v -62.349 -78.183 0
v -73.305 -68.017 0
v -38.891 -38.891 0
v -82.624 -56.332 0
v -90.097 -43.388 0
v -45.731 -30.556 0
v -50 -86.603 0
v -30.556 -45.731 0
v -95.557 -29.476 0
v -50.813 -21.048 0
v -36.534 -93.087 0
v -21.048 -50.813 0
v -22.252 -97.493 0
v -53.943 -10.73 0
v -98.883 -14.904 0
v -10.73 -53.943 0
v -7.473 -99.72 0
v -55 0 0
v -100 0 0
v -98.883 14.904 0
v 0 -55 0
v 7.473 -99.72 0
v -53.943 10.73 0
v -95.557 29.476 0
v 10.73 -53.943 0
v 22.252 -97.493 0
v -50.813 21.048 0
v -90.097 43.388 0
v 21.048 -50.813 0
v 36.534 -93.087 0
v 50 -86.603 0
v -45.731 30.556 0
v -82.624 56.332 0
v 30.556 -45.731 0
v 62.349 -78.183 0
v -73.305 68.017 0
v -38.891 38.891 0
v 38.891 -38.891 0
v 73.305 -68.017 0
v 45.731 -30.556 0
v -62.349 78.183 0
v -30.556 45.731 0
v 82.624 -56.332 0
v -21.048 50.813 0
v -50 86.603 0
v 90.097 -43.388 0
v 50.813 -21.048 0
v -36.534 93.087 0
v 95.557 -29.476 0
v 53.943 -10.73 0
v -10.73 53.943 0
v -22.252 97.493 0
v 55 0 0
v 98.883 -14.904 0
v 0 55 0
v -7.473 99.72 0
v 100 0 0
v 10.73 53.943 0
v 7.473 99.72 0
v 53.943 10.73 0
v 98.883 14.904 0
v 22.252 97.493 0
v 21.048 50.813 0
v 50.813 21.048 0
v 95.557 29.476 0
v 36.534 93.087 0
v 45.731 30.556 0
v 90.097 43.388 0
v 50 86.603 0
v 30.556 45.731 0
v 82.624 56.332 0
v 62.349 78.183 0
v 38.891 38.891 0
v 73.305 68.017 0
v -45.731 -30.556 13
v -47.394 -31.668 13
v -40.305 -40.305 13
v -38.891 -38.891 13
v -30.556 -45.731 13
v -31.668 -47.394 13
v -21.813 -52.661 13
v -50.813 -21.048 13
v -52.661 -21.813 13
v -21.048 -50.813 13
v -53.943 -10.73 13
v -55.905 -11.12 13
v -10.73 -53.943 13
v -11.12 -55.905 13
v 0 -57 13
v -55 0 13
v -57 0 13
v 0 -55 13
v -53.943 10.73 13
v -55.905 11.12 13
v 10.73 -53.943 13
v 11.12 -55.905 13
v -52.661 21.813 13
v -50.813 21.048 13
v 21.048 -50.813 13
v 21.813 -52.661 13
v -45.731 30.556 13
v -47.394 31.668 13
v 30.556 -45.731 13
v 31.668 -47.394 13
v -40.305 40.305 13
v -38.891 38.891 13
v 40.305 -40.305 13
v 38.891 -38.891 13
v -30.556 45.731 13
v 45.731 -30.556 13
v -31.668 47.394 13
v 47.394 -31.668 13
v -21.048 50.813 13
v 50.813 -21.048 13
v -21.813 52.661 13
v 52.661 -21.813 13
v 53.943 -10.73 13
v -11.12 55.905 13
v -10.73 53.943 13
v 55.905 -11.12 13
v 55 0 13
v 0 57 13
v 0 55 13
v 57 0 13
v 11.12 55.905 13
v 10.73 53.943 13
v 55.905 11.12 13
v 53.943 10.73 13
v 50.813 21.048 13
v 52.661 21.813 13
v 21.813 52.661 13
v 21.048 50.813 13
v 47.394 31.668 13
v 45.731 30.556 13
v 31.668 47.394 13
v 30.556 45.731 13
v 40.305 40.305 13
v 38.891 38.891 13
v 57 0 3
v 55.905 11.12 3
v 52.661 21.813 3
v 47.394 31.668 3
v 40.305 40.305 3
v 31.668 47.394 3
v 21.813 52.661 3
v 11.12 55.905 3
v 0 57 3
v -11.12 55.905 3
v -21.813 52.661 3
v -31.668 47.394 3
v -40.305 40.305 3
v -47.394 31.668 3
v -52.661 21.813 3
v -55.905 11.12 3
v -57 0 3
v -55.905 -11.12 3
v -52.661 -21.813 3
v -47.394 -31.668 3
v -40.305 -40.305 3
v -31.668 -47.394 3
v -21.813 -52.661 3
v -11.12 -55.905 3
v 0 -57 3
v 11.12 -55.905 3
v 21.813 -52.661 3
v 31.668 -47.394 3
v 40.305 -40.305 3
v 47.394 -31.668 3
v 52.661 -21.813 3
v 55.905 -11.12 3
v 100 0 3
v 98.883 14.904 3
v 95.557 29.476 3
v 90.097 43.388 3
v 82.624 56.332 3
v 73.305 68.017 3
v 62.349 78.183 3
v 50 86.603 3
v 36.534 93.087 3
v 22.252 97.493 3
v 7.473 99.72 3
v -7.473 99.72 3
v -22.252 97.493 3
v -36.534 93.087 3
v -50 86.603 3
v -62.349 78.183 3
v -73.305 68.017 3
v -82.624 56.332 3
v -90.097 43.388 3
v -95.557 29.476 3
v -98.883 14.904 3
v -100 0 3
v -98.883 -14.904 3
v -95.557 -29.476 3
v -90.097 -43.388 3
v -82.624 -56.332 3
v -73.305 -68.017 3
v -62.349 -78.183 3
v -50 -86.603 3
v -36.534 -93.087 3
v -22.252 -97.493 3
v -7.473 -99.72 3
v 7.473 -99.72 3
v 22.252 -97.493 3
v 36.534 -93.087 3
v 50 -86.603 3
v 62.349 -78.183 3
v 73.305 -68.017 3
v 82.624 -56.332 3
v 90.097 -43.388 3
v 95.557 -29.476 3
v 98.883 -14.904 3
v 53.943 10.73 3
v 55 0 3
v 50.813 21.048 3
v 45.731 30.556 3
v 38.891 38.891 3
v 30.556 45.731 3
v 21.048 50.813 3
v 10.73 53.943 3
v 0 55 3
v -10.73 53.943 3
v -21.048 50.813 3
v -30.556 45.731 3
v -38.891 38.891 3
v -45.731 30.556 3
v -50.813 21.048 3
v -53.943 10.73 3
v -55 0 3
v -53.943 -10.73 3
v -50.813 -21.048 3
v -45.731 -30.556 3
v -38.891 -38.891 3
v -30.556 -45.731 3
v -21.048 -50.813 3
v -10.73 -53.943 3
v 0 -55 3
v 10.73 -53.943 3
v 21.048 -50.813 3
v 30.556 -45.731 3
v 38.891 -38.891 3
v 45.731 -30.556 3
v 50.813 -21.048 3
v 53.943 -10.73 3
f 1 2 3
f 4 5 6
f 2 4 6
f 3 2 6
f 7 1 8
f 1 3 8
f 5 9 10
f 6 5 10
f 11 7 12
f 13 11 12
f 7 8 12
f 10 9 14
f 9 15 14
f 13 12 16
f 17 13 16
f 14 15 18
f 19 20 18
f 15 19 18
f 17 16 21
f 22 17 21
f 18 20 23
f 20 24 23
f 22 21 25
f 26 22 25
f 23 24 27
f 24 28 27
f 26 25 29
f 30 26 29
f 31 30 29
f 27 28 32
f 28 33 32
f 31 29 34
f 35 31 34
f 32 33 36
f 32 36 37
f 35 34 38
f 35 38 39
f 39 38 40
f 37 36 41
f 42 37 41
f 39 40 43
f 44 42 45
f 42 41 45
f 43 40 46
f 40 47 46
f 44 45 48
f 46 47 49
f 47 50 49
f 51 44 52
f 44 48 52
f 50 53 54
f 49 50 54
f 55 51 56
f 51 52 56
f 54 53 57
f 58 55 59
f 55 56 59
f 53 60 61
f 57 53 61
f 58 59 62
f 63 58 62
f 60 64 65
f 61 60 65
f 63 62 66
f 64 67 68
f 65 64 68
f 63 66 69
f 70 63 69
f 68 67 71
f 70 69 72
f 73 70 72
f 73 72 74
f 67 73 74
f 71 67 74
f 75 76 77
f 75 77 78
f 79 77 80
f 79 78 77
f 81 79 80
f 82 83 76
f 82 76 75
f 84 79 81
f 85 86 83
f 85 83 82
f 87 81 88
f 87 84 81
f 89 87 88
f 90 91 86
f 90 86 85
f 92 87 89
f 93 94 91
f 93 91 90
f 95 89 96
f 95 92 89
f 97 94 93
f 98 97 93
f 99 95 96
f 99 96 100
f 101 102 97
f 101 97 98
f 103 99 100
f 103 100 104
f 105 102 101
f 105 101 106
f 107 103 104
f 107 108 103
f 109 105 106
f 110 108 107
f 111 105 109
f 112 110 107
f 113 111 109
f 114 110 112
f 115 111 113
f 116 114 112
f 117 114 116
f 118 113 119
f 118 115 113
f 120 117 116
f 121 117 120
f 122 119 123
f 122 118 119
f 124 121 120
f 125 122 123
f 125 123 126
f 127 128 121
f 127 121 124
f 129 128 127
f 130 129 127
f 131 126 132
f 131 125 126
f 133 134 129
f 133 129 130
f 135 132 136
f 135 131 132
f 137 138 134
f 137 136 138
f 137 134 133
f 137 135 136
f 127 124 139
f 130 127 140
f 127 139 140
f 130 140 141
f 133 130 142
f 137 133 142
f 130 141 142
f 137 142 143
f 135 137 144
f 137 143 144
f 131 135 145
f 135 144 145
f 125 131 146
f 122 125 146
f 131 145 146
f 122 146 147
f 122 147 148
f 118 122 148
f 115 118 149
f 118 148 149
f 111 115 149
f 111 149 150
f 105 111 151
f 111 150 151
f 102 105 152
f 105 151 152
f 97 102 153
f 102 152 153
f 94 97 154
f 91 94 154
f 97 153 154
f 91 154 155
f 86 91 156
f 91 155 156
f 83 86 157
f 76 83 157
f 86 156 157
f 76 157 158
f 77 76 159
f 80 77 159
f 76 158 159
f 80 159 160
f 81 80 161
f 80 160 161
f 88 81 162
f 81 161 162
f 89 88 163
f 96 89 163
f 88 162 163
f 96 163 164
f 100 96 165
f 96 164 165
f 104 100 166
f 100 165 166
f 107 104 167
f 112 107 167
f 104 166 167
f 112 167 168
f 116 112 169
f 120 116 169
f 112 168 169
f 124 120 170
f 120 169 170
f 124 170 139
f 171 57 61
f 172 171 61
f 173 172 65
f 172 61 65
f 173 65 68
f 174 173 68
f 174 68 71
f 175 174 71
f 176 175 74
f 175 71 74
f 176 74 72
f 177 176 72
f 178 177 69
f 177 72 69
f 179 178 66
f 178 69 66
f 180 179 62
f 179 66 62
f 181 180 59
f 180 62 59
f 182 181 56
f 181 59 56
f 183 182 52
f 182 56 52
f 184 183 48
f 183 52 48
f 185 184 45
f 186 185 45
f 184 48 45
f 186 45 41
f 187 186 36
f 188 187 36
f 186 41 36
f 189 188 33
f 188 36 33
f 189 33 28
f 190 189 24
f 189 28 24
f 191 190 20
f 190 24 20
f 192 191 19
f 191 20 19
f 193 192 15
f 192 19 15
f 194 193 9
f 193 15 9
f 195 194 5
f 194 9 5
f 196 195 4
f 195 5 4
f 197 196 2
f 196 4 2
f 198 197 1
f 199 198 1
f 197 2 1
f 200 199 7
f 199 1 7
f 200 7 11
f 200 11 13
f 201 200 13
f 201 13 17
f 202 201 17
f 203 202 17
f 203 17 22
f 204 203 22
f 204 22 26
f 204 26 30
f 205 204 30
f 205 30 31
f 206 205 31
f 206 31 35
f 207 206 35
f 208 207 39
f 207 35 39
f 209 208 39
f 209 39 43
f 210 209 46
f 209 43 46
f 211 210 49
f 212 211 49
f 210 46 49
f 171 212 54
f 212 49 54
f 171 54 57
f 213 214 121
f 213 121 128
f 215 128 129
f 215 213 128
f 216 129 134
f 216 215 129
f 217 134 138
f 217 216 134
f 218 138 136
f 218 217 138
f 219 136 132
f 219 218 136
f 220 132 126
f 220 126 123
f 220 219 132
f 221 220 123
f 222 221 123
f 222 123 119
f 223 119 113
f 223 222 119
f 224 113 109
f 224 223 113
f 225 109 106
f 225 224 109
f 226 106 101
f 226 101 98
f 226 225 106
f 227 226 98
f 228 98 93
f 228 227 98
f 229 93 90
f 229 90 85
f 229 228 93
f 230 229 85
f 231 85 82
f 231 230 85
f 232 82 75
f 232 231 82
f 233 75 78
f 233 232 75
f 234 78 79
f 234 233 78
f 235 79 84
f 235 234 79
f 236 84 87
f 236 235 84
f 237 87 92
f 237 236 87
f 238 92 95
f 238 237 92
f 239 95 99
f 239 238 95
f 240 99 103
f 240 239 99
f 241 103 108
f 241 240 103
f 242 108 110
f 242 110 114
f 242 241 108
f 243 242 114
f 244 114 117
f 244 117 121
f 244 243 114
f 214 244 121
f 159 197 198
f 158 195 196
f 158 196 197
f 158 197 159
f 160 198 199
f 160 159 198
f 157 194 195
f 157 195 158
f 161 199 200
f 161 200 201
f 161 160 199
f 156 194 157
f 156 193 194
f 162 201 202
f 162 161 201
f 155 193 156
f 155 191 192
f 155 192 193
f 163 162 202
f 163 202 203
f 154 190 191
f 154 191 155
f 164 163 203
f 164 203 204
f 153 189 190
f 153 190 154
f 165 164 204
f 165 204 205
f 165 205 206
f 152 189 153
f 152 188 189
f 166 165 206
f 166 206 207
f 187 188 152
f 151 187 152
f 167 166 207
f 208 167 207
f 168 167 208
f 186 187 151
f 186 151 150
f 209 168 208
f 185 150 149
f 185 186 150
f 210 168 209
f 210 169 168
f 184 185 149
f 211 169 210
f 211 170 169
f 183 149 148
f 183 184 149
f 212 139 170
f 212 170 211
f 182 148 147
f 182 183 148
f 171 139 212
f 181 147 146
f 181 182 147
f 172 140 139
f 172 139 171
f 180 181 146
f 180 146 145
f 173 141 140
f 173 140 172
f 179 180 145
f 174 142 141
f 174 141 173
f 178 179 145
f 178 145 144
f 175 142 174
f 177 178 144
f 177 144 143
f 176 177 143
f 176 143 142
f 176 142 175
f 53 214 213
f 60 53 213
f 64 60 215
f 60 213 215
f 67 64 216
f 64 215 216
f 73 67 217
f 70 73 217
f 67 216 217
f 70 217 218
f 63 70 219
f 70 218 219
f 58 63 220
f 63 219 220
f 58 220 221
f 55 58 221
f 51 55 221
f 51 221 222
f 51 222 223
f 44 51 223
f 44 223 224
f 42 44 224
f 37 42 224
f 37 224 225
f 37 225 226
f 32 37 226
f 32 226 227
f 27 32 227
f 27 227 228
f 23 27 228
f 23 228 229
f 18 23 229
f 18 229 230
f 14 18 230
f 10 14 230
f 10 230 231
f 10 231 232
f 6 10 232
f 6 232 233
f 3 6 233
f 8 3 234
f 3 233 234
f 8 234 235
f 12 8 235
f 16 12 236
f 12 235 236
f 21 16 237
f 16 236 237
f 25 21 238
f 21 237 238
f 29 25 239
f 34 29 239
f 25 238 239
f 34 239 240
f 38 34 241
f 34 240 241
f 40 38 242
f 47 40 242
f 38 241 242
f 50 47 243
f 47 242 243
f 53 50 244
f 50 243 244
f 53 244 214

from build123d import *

# Parameters (mm, degrees)
F0_R     = 100
F1_DEPTH = 3
F2_R     = 55
F3_DEPTH = 25
F4_R     = 57
F4_R_2   = 55
F5_DEPTH = 10


with BuildPart() as f1:
    # F0 (on Top) → F1 (new body)
    with BuildSketch(Plane.XY):
        Circle(F0_R)
    extrude(amount=F1_DEPTH)

    # F2 (on face) → F3 (cut)
    with BuildSketch(Plane.XY.offset(3)):
        Circle(F2_R)
    extrude(amount=-F3_DEPTH, mode=Mode.SUBTRACT)

    # F4 (on face) → F5 (join)
    with BuildSketch(Plane.XY.offset(3)):
        Circle(F4_R)
        Circle(F4_R_2, mode=Mode.SUBTRACT)
    extrude(amount=F5_DEPTH)


solid = f1.part
